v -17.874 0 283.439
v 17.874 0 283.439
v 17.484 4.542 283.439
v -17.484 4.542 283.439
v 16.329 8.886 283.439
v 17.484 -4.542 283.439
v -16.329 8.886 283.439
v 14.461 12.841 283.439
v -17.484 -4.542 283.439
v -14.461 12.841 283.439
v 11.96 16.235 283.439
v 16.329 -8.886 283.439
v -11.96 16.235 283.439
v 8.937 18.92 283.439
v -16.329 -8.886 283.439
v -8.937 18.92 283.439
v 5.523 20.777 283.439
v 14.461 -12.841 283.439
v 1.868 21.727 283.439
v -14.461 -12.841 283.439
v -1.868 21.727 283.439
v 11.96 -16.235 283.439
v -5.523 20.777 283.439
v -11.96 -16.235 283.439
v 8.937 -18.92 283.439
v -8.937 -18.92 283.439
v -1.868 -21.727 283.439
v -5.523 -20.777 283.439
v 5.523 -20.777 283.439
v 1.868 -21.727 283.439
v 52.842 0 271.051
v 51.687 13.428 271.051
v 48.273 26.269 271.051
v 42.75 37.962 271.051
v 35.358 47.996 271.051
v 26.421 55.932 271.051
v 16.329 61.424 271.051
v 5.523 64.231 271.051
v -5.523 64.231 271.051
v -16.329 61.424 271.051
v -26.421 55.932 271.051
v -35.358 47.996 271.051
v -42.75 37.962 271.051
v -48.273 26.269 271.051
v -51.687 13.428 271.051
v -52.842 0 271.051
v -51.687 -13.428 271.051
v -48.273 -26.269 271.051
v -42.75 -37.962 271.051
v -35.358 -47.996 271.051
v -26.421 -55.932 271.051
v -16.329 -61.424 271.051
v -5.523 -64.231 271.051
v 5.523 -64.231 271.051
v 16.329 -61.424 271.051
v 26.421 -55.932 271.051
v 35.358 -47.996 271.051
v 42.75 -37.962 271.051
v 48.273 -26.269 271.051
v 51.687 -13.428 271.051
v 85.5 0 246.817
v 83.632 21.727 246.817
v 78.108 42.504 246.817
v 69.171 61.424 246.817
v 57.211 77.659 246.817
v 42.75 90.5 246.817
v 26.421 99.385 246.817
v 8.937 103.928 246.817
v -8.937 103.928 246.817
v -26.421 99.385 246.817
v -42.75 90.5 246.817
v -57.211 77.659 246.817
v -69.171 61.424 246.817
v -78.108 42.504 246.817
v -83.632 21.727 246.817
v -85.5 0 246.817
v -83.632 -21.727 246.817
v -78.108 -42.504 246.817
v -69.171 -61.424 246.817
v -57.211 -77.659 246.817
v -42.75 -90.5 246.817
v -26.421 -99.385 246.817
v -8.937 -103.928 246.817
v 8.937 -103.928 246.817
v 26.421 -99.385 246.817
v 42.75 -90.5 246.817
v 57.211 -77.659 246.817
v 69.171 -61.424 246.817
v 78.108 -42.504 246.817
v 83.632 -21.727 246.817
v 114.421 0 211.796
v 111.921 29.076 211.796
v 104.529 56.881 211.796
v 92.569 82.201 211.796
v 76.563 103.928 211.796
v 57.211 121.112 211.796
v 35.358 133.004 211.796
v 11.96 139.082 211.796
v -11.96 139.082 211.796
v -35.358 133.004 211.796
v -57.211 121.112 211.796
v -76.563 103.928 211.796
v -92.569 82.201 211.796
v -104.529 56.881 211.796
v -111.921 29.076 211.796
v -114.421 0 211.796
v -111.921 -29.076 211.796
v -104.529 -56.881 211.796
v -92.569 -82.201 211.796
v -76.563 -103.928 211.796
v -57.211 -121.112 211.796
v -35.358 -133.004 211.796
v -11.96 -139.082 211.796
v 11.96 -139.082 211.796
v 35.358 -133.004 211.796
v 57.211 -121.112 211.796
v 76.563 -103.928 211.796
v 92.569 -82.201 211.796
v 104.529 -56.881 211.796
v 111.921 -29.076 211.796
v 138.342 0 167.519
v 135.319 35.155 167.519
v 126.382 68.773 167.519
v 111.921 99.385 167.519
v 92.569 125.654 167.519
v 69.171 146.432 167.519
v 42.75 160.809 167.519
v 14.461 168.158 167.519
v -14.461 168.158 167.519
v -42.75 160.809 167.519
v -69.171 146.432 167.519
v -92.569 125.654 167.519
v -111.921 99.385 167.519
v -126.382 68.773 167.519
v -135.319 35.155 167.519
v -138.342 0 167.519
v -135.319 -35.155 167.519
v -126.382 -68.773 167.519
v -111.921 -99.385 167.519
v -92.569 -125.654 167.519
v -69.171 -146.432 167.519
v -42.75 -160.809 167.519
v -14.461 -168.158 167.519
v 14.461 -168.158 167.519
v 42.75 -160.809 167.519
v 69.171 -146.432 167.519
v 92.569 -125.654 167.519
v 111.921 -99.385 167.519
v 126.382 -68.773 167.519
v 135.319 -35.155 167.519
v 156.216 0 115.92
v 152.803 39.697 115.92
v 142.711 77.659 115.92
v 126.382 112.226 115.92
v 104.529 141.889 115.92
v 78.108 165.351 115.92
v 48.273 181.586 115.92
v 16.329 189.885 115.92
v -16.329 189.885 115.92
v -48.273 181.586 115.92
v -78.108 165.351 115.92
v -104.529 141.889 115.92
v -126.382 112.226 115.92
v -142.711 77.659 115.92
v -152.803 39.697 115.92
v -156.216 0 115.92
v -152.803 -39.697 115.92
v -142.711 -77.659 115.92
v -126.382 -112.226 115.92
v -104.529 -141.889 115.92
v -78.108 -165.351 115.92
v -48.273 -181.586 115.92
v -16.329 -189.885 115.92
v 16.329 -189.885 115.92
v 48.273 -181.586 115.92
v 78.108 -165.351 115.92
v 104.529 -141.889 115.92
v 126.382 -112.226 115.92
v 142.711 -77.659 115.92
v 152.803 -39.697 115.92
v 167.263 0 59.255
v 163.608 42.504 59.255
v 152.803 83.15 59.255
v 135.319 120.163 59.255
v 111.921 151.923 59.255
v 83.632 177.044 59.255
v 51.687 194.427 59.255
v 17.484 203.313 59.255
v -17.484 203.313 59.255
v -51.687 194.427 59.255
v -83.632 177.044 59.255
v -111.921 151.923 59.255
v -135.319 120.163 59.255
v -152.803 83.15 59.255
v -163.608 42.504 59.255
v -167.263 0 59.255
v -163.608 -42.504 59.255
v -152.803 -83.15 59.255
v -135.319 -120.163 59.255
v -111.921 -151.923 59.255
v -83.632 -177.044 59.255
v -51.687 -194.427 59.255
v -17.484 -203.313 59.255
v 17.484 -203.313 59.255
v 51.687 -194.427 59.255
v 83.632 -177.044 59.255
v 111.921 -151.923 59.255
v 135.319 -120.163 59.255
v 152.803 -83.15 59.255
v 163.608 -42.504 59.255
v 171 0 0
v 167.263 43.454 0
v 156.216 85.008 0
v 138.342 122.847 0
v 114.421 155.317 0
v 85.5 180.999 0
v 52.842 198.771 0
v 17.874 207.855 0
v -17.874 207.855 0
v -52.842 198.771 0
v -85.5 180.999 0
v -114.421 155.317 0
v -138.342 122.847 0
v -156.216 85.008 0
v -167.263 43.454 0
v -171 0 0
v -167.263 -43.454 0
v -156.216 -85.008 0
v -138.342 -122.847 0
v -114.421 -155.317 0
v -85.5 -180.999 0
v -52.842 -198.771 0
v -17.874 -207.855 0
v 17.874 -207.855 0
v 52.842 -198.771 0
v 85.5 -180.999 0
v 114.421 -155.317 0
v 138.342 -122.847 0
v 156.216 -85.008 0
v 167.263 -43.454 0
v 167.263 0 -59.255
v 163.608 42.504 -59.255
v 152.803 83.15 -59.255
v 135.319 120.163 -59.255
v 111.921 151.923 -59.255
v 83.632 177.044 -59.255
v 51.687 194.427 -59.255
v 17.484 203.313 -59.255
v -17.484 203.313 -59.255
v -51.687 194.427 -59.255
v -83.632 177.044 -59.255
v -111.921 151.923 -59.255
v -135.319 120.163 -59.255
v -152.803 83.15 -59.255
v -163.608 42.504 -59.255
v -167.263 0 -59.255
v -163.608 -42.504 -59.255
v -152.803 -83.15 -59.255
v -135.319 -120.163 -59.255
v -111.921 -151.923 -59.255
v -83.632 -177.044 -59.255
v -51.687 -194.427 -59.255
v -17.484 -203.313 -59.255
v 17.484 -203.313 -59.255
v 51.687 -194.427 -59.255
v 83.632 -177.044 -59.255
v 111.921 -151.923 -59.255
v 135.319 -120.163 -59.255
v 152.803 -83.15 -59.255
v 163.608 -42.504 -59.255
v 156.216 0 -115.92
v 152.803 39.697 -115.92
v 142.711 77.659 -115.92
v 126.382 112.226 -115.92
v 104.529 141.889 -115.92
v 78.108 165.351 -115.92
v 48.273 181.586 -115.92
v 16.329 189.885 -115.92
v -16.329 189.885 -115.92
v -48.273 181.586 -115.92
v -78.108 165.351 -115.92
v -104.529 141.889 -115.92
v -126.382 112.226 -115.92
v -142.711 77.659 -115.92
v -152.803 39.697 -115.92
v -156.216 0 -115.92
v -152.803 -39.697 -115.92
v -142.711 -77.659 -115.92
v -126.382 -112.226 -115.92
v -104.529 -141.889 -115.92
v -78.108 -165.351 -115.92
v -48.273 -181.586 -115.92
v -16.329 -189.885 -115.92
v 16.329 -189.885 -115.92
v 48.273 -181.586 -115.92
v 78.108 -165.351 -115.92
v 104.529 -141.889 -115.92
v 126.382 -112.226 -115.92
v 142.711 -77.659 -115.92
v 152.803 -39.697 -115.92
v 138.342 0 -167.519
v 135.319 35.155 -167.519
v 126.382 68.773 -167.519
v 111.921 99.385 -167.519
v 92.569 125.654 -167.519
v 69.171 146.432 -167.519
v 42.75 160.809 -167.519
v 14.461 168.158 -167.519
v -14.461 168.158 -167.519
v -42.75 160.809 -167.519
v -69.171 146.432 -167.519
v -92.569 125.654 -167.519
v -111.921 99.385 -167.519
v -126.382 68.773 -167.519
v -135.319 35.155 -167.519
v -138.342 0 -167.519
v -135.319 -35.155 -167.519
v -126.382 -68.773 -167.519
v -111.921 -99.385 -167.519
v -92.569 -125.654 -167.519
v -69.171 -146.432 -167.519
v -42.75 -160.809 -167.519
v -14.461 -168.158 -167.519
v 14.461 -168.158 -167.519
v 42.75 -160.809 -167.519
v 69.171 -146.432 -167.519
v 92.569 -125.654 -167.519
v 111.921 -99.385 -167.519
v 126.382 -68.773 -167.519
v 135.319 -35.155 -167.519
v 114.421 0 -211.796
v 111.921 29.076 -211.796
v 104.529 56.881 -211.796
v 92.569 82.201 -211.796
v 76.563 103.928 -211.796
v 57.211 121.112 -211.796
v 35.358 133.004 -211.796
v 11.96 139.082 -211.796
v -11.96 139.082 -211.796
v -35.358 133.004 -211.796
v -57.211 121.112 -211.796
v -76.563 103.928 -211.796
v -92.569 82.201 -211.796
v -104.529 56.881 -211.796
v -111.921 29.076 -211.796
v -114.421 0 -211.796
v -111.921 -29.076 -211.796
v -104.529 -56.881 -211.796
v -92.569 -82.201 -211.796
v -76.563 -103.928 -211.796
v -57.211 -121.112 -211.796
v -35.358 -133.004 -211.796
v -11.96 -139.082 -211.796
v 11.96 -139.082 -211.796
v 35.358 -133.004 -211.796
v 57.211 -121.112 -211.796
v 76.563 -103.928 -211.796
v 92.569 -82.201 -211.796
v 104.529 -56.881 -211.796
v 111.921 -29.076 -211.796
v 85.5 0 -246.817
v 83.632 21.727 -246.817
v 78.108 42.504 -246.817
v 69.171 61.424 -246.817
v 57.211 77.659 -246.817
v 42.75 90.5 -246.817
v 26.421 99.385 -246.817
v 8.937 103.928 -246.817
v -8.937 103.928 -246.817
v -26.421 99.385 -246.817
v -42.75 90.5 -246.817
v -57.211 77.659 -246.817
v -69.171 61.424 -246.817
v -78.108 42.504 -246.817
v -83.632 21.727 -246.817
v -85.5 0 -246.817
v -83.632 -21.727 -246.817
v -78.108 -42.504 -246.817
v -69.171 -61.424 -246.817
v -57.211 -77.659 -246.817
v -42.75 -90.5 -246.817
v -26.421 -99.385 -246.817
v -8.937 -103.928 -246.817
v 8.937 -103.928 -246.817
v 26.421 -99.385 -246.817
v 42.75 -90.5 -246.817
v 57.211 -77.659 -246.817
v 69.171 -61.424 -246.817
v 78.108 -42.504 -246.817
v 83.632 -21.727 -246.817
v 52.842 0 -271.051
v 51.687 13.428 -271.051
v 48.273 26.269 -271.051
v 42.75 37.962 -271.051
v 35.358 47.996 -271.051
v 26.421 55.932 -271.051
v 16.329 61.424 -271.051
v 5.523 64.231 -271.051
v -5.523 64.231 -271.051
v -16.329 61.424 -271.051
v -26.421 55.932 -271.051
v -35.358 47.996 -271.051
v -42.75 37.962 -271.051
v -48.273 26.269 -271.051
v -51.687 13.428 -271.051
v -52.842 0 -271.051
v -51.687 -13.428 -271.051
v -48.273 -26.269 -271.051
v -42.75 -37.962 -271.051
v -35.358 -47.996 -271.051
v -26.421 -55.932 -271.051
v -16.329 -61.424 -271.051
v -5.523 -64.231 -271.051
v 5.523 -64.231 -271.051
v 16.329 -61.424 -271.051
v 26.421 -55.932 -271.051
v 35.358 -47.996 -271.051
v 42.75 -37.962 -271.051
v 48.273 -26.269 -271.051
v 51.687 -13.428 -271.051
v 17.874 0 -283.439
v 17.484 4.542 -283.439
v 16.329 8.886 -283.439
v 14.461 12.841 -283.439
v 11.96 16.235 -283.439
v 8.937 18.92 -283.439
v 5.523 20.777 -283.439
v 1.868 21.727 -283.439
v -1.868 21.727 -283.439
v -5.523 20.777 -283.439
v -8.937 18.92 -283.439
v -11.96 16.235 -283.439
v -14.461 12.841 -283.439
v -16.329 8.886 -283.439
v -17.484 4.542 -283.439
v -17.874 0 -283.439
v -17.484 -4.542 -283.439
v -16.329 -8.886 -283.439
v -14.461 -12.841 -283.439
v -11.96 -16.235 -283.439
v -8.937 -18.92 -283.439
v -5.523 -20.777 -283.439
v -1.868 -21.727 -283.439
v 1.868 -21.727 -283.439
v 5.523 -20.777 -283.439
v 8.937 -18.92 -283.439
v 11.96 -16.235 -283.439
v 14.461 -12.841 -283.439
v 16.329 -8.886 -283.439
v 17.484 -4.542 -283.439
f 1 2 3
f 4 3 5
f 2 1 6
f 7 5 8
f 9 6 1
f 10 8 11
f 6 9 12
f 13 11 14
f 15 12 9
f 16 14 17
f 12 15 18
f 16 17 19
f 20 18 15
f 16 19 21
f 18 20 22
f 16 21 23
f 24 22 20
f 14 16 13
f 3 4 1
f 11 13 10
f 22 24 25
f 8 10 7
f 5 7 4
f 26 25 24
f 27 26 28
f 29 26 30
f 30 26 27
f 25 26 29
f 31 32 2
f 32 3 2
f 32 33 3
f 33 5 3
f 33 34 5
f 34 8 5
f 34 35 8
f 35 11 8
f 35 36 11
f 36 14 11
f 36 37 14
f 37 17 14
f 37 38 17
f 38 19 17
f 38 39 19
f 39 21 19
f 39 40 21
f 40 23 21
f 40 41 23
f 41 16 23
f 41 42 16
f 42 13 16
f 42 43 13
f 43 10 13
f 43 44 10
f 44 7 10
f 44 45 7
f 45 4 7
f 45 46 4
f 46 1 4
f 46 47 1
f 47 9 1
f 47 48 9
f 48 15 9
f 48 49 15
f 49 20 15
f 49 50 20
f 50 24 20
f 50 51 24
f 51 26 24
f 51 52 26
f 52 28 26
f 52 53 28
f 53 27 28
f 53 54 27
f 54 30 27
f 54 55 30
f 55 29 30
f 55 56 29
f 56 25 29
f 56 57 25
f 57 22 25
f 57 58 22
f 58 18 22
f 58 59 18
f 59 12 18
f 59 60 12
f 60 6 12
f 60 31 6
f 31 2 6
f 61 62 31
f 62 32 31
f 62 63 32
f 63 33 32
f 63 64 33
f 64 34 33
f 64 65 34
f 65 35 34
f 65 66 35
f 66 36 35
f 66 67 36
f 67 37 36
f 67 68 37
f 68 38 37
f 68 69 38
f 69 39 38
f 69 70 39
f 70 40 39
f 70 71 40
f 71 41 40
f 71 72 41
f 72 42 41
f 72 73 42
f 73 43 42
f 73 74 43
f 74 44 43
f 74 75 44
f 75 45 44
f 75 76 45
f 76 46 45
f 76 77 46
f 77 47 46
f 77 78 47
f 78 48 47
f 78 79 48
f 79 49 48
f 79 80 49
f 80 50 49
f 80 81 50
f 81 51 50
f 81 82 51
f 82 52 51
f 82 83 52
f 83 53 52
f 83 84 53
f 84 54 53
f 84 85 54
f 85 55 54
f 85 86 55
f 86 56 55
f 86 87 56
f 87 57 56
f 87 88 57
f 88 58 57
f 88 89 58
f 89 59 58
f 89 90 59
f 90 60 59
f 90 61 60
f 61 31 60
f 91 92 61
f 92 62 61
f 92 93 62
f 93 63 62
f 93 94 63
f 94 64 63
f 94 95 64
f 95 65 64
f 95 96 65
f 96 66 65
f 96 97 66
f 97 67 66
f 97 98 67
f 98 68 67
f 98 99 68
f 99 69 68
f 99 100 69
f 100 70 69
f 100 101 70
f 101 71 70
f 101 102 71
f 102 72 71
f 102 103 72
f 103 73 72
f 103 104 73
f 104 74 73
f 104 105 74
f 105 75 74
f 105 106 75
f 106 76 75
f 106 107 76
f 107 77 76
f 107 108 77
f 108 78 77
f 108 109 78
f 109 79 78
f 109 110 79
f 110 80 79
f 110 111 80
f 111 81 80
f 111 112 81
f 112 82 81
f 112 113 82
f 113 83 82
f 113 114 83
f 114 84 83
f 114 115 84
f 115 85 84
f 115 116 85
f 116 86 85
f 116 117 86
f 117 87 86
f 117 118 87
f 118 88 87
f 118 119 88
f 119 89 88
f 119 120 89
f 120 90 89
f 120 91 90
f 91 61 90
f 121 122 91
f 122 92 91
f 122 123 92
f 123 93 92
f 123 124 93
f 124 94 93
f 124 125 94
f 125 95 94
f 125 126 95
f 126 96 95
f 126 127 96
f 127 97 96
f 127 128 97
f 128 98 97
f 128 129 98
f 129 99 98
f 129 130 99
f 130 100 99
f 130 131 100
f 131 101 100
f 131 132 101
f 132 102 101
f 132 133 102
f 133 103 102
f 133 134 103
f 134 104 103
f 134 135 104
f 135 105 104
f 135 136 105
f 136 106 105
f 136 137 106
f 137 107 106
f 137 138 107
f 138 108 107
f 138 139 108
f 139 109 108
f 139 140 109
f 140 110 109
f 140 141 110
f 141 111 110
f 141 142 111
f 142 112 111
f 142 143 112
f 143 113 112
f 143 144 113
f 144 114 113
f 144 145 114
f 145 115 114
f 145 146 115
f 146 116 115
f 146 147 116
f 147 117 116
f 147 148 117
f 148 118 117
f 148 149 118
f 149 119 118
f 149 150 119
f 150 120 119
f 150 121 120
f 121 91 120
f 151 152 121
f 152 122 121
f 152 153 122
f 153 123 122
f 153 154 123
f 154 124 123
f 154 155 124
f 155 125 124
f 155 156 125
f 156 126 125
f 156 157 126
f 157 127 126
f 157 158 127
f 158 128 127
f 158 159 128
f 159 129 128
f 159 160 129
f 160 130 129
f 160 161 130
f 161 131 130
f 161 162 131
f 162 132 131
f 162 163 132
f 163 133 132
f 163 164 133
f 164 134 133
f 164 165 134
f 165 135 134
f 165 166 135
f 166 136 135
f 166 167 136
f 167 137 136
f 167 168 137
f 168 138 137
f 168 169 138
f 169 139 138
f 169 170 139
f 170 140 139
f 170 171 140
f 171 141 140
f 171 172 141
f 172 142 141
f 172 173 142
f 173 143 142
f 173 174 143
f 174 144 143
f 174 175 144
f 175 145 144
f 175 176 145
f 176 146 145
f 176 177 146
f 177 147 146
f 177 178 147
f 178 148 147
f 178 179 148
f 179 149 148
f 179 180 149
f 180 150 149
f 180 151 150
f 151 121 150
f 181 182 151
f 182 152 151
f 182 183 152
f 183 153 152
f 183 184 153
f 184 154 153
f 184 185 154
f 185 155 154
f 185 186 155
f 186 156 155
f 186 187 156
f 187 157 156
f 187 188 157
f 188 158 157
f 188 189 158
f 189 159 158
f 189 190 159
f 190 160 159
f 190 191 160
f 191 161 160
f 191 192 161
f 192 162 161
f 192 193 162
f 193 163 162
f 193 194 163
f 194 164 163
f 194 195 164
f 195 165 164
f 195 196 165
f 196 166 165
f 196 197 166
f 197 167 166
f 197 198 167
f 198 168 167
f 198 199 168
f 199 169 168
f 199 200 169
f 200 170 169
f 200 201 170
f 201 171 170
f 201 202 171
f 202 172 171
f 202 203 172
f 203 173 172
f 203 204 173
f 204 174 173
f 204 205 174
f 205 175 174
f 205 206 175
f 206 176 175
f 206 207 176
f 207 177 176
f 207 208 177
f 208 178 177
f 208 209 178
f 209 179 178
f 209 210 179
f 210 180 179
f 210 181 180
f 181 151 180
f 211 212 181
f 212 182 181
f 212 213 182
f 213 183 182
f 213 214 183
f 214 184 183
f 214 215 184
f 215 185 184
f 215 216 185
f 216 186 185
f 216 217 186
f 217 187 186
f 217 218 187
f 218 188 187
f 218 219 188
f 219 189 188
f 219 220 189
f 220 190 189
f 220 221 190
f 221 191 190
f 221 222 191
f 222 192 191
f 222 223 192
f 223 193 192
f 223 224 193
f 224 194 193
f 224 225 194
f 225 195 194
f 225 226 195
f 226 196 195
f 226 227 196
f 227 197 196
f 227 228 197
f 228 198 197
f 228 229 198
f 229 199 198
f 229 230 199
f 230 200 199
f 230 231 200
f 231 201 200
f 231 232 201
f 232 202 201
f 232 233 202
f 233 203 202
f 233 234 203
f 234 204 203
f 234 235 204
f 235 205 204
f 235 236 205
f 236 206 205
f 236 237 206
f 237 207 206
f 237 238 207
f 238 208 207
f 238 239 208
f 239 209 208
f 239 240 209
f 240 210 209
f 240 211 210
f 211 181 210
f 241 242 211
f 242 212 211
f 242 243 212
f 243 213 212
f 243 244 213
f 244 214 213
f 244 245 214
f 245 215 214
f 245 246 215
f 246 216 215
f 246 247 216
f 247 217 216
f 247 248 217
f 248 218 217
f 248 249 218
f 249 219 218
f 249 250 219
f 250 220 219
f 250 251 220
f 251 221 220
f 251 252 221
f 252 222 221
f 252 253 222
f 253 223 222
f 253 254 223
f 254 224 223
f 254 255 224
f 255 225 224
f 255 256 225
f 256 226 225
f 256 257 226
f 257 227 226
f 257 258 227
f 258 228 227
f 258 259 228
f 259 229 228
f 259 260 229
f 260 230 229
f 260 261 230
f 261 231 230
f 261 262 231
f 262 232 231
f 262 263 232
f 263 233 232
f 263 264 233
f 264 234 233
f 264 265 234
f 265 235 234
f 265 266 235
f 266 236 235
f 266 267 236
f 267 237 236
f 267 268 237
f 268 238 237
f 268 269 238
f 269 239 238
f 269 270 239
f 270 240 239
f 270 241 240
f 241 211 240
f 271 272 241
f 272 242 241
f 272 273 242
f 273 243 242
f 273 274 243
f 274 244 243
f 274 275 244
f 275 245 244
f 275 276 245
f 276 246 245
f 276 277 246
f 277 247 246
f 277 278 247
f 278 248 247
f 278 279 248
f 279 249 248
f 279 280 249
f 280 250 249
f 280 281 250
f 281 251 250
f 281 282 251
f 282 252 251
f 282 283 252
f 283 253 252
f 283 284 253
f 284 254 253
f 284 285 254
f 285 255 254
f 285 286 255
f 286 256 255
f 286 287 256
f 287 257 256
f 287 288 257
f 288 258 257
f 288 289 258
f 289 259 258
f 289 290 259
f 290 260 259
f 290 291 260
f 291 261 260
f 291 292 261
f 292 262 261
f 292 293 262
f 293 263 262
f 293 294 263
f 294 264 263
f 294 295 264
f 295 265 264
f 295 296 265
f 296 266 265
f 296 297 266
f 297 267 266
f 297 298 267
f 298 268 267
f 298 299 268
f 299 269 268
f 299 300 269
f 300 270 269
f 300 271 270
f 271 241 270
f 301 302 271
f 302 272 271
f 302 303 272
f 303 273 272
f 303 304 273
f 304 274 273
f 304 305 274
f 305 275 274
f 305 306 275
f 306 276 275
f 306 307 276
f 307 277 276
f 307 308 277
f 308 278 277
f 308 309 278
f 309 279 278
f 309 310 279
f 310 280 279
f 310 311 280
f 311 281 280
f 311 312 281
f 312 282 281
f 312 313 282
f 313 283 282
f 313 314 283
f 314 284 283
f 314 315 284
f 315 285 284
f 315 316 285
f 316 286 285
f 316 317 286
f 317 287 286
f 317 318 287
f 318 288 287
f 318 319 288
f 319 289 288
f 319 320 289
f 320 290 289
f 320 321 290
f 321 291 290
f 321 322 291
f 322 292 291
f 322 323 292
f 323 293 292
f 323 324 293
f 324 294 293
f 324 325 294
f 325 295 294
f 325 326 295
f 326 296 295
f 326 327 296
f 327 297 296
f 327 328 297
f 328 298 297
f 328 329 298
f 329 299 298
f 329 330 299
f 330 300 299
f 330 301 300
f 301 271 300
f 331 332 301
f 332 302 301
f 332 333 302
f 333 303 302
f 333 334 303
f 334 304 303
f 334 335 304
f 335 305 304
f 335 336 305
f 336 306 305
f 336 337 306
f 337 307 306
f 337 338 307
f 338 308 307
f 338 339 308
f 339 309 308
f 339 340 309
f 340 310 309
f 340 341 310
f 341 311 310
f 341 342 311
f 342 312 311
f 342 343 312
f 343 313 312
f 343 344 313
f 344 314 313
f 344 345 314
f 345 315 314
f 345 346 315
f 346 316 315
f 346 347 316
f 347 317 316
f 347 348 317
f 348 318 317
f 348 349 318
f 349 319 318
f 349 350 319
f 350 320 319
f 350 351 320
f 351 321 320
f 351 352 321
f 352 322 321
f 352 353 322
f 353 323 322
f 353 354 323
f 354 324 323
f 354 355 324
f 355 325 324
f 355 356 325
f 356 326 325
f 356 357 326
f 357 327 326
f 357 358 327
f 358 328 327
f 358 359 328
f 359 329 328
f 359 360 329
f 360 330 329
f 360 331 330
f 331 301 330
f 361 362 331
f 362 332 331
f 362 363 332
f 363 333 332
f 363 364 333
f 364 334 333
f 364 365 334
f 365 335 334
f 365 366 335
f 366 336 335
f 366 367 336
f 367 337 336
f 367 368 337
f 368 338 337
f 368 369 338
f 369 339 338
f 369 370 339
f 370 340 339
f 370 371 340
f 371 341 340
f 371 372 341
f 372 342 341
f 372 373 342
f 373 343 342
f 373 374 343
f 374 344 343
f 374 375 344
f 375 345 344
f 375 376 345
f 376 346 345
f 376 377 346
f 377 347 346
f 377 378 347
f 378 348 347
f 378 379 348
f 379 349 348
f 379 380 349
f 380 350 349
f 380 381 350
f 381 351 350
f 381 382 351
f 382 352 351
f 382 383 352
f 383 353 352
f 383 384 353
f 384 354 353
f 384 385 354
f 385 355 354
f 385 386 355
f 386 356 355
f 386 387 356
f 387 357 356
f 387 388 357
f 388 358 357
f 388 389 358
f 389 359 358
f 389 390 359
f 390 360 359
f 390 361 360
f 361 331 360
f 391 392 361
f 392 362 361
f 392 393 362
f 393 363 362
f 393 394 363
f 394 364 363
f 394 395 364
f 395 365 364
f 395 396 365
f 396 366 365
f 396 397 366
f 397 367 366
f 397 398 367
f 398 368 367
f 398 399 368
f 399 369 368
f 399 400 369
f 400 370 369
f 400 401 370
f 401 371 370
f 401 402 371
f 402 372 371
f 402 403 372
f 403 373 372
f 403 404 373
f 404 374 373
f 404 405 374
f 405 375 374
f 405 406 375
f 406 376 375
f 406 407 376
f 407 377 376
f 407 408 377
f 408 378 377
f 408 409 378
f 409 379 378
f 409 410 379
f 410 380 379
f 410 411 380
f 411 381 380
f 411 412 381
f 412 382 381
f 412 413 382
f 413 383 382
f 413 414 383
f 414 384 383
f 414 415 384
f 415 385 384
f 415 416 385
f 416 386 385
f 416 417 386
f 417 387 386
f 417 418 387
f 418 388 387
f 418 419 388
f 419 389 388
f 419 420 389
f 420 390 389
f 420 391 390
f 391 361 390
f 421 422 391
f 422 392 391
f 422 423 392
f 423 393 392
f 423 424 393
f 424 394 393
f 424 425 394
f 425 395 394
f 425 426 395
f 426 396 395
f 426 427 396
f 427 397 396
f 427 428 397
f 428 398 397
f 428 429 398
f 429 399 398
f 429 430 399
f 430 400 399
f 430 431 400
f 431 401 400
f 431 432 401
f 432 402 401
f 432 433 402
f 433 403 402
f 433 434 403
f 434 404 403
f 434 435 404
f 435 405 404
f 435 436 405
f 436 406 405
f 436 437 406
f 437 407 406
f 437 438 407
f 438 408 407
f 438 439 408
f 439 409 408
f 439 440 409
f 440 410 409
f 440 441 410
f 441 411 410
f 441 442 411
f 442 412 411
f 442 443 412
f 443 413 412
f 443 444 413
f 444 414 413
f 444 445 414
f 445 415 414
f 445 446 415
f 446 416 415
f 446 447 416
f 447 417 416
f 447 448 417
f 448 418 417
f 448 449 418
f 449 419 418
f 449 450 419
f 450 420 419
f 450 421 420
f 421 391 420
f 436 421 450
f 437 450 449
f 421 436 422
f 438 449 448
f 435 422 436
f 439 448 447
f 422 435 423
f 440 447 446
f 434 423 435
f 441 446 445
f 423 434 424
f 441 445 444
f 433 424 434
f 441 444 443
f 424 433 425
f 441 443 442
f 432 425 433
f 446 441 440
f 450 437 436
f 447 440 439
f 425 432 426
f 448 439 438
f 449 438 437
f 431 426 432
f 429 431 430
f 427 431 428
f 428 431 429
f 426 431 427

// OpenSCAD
// Generated by SolidPython 1.0.1 on 2020-07-29 00:46:48


scale(v = [9, 11, 15]) {
	sphere(r = 19);
}
/***********************************************
*********      SolidPython code:      **********
************************************************
 
# import packages: SolidPython
from solid import *
from solid.utils import *
from itertools import chain, combinations, permutations


class Resize:

    def __init__(self, scad_file):
        self.scad_file = scad_file
        #self.scad_file = import_scad(scad_file)
        # cone/cylinder param:
        self.r1 = 0
        self.r2 = 0
        self.h = 0
        # rectangular prism param:
        self.w = 0
        self.l = 0
        # ellipse param:
        self.r = 0

    # import OpenScad code (file name corresponds to shape)


    # classify shape + parameters
    def assign(self, param1, param2, param3):
        if self.scad_file == 'cone.scad':
            self.r1 = param1
            self.r2 = param2
            self.h = param3
        elif self.scad_file == 'cylinder.scad':
            self.r1 = param1
            self.r2 = param2
            self.h = param3
        elif self.scad_file == 'rectangularPrism.scad':
            self.h = param1
            self.l = param2
            self.w = param3
        else:
            self.r = param1
            self.h = param2

    # resize parameters
    def iterate(self):
        x = range(3, 20, 2)
        i = 1
        if self.scad_file == 'cone.scad':
            tempList = list(permutations(x, 2))
            for temp in tempList:
                param1 = temp[0]
                param2 = temp[1]
                filepath = 'produced_scad_files/' + 'cone' + str(param1) + '_' + str(param2) + '_' + '.scad'
                scad_render_to_file(cylinder(h=param1, r1=param2, r2=0), filepath)

        elif self.scad_file == 'cylinder.scad':
            tempList = list(permutations(x, 3))
            for temp in tempList:
                param1 = temp[0]
                param2 = temp[1]
                filepath = 'produced_scad_files/' + 'cylinder' + str(param1) + '_' + str(param2) + '_' + '.scad'
                scad_render_to_file(cylinder(h=param1, r1=param2, r2=param2), filepath)

        elif self.scad_file == 'rectangularPrism.scad':
            tempList = list(permutations(x, 3))
            for temp in tempList:
                param1 = temp[0]
                param2 = temp[1]
                param3 = temp[2]
                filepath = 'produced_scad_files/' + 'rectangularPrism' + str(param1) + '_' + str(param2) + '_' + str(
                    param3) + '.scad'
                scad_render_to_file(cube(size=(param1, param2, param3)), filepath)

        elif self.scad_file == 'ellipse.scad':
            tempList = list(permutations(x, 4))
            for temp in tempList:
                param1 = temp[0]
                param2 = temp[1]
                param3 = temp[2]
                param4 = temp[3]
                filepath = 'produced_scad_files/' + 'ellipse' + str(param1) + '_' + str(param2) + '_' + str(param3) + '_' + str(param4) + '.scad'
                scad_render_to_file(scale([param1, param2, param3])(sphere(r=param4)), filepath)

    def render_to_scadfile(self):
        scad_render_to_file(scad, 'example.scad') 
 
************************************************/
